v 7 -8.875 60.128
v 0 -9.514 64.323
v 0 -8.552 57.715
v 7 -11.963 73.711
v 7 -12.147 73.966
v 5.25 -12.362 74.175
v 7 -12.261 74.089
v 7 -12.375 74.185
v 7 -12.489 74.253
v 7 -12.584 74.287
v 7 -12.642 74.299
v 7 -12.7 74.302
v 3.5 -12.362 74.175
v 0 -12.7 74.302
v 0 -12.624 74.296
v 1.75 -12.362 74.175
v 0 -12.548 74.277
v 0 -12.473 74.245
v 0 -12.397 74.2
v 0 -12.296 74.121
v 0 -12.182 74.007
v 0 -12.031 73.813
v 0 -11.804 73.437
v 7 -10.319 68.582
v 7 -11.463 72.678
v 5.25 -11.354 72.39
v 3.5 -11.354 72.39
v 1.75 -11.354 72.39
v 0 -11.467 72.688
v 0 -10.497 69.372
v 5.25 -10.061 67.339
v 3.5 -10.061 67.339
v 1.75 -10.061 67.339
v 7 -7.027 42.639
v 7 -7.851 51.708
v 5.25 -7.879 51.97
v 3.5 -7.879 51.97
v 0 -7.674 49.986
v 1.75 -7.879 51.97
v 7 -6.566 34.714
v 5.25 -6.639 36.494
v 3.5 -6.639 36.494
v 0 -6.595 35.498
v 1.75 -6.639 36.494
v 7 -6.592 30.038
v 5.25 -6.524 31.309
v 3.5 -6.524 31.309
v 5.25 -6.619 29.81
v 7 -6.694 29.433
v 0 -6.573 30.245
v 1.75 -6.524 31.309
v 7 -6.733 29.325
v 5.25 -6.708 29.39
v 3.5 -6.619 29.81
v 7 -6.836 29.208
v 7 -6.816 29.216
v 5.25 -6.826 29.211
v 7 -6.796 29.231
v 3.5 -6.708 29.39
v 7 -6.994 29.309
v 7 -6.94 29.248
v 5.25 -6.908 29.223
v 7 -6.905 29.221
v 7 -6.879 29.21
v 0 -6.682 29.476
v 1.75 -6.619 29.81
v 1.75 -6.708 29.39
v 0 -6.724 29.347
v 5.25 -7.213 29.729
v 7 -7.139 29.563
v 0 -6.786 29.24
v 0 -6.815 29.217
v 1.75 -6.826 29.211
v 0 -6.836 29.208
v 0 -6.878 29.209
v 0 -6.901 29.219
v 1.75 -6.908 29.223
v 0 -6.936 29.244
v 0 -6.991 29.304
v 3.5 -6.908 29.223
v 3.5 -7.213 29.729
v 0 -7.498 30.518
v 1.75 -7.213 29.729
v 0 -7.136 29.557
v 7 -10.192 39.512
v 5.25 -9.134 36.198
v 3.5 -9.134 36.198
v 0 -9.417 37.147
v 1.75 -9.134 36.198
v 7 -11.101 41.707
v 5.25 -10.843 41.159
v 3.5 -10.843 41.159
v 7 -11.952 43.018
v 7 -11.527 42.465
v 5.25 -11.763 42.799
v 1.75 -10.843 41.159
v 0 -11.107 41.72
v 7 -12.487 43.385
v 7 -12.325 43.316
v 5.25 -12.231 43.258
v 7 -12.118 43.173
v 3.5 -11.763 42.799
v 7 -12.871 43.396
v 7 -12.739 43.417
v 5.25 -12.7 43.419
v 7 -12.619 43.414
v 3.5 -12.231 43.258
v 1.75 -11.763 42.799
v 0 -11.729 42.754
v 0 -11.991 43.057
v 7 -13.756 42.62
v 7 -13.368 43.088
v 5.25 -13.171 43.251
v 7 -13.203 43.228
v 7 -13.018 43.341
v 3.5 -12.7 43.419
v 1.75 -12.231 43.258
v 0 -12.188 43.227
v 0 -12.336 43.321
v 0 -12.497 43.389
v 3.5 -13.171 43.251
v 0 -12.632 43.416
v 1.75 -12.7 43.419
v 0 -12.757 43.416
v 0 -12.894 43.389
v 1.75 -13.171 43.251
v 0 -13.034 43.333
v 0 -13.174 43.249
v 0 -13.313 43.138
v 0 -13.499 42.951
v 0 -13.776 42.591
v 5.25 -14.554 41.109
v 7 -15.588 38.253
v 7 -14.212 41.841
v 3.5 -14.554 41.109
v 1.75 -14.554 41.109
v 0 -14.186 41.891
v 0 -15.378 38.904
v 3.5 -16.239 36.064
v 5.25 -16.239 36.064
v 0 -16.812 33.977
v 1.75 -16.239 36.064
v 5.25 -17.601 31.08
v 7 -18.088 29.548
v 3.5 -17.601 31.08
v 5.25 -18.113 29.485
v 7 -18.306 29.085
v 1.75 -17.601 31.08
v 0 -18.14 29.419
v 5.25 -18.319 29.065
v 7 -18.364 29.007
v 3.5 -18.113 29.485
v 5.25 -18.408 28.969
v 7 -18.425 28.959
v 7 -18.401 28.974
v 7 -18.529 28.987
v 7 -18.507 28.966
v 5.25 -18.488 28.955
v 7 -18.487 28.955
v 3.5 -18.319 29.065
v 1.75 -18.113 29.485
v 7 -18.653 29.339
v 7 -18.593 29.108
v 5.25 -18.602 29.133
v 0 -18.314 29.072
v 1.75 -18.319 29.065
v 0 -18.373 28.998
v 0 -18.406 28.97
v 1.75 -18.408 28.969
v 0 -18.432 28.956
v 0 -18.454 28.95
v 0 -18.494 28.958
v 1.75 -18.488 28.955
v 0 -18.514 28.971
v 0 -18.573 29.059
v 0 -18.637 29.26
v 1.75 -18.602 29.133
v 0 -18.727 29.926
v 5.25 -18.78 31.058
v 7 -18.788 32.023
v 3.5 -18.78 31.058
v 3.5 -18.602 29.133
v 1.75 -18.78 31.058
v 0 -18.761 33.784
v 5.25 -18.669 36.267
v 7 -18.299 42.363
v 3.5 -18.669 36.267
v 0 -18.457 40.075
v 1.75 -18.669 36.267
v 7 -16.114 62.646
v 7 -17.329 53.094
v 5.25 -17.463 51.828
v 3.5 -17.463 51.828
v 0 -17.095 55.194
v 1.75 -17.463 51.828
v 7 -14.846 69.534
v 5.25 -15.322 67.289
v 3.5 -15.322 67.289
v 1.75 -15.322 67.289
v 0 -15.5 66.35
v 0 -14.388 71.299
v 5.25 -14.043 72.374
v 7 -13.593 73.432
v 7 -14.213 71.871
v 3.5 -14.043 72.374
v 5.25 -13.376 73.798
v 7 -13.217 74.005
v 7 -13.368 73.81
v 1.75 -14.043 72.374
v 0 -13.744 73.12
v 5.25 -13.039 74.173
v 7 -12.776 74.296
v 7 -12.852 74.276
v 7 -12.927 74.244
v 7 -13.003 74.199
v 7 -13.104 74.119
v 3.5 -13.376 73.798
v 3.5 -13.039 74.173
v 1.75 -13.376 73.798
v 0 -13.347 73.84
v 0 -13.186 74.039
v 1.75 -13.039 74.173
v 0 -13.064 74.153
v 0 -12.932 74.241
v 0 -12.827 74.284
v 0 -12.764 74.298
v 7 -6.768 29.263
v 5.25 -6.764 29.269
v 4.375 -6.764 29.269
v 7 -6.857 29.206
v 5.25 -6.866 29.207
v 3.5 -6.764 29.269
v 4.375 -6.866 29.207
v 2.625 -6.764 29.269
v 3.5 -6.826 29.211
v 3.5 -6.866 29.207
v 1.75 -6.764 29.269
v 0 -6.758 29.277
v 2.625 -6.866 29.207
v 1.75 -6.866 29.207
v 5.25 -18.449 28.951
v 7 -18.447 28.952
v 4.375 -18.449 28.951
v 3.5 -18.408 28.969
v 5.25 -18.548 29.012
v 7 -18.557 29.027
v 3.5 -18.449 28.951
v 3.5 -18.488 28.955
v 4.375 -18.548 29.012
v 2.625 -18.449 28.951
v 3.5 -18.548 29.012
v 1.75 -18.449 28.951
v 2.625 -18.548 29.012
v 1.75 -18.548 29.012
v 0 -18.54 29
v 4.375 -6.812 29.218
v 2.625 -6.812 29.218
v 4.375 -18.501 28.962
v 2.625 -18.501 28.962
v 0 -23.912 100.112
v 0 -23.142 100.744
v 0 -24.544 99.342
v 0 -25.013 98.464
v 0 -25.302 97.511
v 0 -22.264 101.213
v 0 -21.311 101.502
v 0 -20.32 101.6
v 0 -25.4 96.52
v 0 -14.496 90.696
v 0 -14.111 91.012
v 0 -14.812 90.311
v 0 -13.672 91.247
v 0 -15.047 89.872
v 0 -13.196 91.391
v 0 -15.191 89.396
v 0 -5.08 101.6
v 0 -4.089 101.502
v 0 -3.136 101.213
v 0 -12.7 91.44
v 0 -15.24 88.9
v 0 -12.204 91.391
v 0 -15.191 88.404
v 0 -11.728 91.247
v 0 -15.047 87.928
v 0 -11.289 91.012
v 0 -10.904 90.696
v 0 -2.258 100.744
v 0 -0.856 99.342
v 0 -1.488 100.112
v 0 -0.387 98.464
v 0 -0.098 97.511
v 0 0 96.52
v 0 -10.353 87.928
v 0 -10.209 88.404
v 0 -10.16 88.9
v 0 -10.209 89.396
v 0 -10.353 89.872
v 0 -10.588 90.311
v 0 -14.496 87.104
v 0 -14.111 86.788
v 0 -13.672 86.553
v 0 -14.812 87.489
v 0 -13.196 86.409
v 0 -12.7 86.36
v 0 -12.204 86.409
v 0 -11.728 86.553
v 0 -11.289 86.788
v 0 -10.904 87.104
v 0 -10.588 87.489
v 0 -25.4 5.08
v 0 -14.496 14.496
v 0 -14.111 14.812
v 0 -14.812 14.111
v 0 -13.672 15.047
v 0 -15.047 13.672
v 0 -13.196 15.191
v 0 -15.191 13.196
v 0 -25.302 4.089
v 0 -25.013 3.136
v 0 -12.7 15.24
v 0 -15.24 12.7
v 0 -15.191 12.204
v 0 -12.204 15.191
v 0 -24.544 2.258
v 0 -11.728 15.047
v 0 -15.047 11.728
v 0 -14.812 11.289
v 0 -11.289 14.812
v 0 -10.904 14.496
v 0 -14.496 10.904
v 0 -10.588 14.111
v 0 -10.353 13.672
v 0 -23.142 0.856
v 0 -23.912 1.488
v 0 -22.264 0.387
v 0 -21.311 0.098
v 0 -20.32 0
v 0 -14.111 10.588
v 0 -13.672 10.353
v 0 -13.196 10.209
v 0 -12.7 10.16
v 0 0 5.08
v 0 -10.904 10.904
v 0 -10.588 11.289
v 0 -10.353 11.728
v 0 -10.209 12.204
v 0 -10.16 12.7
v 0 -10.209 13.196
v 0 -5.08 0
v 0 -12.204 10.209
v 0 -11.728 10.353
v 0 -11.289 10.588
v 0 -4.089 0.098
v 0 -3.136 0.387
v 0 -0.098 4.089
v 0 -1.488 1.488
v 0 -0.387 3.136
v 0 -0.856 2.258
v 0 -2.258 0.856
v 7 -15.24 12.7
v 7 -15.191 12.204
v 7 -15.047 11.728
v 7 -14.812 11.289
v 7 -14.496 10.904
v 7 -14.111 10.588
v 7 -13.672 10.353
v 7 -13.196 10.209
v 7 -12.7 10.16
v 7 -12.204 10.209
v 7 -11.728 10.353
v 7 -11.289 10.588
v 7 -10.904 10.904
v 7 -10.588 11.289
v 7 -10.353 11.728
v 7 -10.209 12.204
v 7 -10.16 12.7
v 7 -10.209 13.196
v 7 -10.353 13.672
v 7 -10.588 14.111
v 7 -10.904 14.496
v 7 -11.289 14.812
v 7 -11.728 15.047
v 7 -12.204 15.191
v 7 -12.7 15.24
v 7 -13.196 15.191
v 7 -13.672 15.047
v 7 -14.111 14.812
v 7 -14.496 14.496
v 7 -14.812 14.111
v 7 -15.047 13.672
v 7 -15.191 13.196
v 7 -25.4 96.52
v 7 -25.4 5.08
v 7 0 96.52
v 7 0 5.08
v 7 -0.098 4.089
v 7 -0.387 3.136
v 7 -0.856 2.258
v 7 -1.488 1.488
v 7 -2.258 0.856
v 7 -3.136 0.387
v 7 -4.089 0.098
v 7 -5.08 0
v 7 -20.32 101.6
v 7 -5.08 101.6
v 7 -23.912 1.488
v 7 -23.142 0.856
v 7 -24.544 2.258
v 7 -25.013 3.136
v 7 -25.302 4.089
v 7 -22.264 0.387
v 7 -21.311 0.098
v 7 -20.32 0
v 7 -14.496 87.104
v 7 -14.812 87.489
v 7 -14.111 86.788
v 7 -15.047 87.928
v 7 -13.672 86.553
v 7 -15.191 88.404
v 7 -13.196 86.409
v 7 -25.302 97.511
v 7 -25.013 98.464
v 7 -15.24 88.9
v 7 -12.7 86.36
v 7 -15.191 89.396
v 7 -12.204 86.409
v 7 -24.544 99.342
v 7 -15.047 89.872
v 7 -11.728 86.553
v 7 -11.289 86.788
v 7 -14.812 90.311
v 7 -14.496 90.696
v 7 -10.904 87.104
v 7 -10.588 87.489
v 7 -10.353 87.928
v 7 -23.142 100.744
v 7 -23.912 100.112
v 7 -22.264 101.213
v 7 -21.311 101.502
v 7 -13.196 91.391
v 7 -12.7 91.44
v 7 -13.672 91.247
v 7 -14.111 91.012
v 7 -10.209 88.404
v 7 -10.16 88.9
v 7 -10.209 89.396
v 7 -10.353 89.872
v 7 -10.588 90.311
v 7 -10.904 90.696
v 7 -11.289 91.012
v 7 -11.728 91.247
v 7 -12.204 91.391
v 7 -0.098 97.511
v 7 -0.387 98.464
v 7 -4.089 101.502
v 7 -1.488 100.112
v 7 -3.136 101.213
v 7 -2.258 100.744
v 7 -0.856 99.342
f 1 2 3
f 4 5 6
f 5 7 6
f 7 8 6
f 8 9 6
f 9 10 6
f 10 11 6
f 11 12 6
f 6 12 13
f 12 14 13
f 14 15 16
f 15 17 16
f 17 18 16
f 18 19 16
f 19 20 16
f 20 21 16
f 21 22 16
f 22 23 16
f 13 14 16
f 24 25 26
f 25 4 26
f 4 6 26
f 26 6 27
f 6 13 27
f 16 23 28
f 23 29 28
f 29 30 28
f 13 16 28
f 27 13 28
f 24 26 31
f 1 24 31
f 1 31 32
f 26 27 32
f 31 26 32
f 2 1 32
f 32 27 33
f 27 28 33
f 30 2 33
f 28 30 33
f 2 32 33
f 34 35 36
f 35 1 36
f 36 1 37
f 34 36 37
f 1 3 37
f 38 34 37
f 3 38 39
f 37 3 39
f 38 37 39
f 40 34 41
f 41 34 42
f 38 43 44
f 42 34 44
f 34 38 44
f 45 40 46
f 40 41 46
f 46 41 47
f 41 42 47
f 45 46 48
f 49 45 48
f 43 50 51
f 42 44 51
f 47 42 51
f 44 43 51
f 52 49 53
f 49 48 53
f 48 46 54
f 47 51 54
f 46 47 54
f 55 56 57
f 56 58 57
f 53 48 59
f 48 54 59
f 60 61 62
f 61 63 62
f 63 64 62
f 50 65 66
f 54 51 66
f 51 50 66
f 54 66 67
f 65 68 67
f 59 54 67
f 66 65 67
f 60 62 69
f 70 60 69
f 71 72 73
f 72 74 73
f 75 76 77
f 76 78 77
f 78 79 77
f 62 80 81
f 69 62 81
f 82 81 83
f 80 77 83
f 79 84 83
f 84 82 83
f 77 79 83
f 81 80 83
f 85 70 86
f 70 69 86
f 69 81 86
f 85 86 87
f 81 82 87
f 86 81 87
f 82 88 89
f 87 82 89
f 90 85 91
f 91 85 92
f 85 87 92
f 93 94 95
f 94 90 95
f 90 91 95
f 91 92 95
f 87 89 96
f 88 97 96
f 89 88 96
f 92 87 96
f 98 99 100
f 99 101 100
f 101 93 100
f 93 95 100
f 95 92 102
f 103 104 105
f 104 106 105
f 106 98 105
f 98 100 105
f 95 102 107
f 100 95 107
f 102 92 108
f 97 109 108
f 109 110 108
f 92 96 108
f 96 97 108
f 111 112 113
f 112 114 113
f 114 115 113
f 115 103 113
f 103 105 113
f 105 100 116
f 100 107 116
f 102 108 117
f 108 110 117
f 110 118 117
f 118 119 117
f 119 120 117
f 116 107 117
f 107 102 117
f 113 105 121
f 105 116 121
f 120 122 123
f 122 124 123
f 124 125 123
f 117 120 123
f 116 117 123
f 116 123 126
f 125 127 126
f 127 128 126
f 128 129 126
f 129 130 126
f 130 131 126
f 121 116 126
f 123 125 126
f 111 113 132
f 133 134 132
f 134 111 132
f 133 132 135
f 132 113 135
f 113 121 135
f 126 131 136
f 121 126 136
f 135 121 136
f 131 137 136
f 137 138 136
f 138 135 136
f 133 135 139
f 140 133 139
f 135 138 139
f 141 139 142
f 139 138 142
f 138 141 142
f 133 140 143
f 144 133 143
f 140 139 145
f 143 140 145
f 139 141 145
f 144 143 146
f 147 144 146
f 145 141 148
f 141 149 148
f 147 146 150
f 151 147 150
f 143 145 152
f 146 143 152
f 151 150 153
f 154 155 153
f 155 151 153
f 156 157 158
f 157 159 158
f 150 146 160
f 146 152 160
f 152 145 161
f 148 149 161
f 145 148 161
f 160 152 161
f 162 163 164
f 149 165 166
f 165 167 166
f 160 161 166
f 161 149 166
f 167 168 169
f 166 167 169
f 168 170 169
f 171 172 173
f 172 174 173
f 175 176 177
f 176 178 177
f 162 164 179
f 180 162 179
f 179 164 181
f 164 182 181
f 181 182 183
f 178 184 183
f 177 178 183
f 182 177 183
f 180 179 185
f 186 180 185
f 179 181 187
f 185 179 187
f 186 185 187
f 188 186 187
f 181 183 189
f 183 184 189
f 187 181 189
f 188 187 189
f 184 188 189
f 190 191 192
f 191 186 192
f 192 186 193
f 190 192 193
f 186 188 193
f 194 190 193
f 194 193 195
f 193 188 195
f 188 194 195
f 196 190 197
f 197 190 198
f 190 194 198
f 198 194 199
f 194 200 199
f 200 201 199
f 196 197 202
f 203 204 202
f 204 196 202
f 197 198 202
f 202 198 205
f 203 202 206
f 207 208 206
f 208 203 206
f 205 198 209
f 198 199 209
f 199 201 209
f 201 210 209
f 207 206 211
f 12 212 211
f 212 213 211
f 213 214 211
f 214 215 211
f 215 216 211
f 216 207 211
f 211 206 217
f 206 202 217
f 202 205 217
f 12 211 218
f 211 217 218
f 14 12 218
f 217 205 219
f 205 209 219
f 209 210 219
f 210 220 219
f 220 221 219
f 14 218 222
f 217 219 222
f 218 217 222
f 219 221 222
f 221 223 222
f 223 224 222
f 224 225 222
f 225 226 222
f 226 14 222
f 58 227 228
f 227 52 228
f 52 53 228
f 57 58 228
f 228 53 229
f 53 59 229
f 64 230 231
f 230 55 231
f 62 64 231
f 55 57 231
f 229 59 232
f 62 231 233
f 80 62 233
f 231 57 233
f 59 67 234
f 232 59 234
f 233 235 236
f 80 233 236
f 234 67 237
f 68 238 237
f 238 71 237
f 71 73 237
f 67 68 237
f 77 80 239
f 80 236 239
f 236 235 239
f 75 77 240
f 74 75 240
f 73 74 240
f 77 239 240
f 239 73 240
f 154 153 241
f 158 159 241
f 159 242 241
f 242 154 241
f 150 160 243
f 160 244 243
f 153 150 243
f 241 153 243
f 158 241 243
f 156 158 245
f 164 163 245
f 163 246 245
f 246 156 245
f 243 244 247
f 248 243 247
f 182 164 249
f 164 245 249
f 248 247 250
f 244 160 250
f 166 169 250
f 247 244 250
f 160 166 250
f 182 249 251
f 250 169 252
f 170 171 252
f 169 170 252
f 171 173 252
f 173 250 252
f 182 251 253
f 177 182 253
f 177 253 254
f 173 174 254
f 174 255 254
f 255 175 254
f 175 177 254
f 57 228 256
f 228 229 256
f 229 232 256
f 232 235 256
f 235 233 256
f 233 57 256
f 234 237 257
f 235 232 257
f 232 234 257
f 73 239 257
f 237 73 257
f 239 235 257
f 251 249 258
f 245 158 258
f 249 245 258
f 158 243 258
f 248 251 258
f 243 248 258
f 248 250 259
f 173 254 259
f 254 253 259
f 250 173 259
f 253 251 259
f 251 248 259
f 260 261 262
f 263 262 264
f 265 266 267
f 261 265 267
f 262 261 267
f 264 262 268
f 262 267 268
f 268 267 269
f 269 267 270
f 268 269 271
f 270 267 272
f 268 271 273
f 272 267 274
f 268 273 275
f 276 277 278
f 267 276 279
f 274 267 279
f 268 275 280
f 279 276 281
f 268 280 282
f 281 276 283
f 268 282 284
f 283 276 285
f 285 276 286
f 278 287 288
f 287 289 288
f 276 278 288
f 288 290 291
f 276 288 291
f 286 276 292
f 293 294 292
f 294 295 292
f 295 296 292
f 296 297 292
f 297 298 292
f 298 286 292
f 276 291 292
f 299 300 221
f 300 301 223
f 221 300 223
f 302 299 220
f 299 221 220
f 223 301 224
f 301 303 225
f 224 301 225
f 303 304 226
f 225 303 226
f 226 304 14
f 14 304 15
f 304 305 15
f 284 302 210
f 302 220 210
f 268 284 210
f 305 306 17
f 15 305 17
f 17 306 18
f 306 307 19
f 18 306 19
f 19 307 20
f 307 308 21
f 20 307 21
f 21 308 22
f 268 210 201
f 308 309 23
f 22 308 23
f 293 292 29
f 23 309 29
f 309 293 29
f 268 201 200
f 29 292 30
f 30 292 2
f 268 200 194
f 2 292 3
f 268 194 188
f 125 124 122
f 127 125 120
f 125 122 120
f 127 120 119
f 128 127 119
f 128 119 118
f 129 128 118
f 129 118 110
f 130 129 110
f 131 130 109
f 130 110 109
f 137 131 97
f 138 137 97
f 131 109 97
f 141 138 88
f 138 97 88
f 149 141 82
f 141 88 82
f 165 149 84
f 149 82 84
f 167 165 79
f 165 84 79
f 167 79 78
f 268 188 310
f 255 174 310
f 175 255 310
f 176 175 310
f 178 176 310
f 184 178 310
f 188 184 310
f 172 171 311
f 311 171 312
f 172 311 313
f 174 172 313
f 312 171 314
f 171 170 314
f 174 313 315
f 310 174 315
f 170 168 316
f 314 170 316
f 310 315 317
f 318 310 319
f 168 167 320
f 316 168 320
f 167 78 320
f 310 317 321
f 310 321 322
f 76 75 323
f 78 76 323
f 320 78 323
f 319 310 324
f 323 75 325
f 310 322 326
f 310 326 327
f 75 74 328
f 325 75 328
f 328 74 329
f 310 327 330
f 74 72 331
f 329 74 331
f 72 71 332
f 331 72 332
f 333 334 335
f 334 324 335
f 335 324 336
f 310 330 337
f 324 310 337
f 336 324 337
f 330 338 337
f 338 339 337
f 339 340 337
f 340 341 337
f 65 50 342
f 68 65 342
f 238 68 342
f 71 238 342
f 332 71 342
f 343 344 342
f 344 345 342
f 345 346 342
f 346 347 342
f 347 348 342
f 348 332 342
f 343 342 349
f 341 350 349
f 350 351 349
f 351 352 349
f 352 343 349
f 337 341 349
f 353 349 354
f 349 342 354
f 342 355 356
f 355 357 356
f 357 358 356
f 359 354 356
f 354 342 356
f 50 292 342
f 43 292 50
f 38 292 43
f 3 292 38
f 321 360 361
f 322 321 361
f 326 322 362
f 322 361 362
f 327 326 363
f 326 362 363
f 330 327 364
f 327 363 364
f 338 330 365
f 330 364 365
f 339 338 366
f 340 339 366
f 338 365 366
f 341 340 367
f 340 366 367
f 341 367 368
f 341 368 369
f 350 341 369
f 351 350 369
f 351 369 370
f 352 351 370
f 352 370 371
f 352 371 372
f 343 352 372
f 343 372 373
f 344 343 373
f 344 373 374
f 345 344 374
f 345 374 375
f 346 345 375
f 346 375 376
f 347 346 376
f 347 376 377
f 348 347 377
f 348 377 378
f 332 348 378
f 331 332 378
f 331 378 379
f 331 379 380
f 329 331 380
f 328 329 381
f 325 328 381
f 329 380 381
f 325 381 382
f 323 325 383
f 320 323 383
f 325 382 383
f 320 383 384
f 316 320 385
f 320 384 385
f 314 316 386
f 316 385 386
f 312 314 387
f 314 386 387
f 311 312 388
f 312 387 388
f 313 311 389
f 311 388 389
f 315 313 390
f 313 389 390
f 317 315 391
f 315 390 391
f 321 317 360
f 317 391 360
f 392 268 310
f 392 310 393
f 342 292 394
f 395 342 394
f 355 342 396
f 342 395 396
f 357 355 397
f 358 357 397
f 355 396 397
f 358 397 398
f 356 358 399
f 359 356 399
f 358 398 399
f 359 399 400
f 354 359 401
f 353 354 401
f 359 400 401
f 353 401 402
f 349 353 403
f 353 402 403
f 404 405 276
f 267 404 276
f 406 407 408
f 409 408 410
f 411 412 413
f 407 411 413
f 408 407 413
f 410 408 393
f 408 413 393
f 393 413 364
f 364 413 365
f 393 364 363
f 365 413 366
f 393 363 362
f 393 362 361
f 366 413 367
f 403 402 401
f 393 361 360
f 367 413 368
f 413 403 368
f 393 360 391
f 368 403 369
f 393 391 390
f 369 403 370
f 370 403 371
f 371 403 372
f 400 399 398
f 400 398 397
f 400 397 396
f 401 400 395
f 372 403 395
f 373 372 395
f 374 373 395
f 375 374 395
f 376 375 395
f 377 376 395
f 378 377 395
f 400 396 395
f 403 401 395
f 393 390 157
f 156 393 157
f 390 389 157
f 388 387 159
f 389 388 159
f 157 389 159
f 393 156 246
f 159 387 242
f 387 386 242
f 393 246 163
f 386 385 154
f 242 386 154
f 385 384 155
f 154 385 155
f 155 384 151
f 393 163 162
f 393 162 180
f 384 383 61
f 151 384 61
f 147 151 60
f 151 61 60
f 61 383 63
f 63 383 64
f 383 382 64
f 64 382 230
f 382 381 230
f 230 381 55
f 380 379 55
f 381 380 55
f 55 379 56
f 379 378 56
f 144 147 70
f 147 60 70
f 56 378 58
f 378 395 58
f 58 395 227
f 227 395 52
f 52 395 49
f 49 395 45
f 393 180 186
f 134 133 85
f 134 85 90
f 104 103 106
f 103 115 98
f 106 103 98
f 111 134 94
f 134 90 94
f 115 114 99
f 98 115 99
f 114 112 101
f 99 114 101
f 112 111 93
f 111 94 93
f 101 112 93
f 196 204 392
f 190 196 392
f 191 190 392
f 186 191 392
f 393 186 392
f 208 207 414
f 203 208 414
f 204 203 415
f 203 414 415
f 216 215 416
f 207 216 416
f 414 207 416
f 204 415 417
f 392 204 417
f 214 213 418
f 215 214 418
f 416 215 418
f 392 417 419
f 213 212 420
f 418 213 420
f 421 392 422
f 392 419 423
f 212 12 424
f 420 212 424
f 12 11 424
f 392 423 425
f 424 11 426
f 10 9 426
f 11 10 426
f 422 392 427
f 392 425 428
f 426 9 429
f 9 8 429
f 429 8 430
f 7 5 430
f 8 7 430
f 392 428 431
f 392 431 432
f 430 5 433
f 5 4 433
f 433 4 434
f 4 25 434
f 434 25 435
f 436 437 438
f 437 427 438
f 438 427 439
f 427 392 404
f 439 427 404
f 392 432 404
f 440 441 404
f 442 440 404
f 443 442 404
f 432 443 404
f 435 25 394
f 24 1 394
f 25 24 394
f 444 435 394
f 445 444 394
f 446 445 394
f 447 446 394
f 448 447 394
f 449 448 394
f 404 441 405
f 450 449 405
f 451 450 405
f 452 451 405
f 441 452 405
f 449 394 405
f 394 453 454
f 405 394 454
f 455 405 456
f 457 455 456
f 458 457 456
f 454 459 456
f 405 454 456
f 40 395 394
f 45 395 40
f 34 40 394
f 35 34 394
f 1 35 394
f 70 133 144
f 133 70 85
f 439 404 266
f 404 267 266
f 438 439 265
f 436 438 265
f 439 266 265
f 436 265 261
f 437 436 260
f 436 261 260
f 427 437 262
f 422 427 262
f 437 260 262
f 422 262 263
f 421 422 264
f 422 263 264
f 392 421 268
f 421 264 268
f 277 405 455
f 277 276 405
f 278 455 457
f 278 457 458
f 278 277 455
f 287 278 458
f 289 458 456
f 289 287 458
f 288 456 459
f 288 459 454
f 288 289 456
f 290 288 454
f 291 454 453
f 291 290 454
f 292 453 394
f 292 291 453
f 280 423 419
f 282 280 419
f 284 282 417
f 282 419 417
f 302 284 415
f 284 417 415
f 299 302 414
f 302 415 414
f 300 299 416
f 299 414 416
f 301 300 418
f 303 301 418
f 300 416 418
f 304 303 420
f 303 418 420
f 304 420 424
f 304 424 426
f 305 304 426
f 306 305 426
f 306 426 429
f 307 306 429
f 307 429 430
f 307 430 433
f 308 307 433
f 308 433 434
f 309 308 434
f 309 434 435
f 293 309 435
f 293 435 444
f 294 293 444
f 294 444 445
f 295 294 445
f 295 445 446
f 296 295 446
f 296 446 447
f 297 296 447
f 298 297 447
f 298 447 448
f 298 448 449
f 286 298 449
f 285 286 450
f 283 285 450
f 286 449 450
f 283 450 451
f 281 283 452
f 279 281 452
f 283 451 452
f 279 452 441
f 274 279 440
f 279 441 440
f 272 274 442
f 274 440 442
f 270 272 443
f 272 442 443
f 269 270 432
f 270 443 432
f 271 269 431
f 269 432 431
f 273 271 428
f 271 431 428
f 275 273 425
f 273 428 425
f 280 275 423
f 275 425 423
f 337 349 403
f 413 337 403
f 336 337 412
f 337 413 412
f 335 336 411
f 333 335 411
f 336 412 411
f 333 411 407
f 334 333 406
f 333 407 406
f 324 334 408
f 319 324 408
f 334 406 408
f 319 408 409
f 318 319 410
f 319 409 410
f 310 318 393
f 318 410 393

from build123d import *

# Parameters (mm, degrees)
F1_DEPTH = 25.4
F3_D     = 5.08
F2_R     = 2.4252115648
F4_DEPTH = 7.001
F5_D     = 5.08
F6_R     = 5.08
F7_R     = 5.08


with BuildPart() as f1:
    # F0 (on Front) → F1 (new body)
    with BuildSketch(Plane.XZ):
        Polygon((7, 101.6), (0, 101.6), (0, 0), (7, 0), (7, 3.6533342209), align=None)
    extrude(amount=F1_DEPTH)

    # F3 (through all)
    with Locations(Plane(origin=(0, 0, 0), x_dir=(0, 1, 0), z_dir=(-1, 0, 0))):
        with Locations((-12.7, -88.9)):
            Hole(F3_D / 2)

    # F2 (on Right) → F4 (cut, through all)
    with BuildSketch(Plane.YZ):
        with Locations((-12.7, 88.9)):
            Circle(F2_R)
        with BuildLine():
            add(Edge.make_bspline(
                [(-12.7, 74.3024547756), (-9.0931384906, 74.3114171346), (-3.2674369503, 3.8706315676), (-12.7636589757, 58.0743659318), (-21.9217417349, 3.344276822), (-16.3164932292, 74.2934684836), (-12.7, 74.3024547756)],
                knots=[0, 0, 0, 0, 0.3155118447, 0.4989692674, 0.6836456163, 1, 1, 1, 1], degree=3))
        make_face()
    extrude(amount=F4_DEPTH, mode=Mode.SUBTRACT)

    # F5 (through all)
    with Locations(Plane(origin=(0, 0, 0), x_dir=(0, 1, 0), z_dir=(-1, 0, 0))):
        with Locations((-12.7, -12.7)):
            Hole(F5_D / 2)

    # F6
    f6_edges = [f1.edges().sort_by_distance(p)[0] for p in [
        (3.5, -25.4, 101.6),
        (3.5, 0, 101.6),
    ]]
    fillet(f6_edges, radius=F6_R)

    # F7
    f7_edges = [f1.edges().sort_by_distance(p)[0] for p in [
        (3.5, -25.4, 0),
        (3.5, 0, 0),
    ]]
    fillet(f7_edges, radius=F7_R)


solid = f1.part
